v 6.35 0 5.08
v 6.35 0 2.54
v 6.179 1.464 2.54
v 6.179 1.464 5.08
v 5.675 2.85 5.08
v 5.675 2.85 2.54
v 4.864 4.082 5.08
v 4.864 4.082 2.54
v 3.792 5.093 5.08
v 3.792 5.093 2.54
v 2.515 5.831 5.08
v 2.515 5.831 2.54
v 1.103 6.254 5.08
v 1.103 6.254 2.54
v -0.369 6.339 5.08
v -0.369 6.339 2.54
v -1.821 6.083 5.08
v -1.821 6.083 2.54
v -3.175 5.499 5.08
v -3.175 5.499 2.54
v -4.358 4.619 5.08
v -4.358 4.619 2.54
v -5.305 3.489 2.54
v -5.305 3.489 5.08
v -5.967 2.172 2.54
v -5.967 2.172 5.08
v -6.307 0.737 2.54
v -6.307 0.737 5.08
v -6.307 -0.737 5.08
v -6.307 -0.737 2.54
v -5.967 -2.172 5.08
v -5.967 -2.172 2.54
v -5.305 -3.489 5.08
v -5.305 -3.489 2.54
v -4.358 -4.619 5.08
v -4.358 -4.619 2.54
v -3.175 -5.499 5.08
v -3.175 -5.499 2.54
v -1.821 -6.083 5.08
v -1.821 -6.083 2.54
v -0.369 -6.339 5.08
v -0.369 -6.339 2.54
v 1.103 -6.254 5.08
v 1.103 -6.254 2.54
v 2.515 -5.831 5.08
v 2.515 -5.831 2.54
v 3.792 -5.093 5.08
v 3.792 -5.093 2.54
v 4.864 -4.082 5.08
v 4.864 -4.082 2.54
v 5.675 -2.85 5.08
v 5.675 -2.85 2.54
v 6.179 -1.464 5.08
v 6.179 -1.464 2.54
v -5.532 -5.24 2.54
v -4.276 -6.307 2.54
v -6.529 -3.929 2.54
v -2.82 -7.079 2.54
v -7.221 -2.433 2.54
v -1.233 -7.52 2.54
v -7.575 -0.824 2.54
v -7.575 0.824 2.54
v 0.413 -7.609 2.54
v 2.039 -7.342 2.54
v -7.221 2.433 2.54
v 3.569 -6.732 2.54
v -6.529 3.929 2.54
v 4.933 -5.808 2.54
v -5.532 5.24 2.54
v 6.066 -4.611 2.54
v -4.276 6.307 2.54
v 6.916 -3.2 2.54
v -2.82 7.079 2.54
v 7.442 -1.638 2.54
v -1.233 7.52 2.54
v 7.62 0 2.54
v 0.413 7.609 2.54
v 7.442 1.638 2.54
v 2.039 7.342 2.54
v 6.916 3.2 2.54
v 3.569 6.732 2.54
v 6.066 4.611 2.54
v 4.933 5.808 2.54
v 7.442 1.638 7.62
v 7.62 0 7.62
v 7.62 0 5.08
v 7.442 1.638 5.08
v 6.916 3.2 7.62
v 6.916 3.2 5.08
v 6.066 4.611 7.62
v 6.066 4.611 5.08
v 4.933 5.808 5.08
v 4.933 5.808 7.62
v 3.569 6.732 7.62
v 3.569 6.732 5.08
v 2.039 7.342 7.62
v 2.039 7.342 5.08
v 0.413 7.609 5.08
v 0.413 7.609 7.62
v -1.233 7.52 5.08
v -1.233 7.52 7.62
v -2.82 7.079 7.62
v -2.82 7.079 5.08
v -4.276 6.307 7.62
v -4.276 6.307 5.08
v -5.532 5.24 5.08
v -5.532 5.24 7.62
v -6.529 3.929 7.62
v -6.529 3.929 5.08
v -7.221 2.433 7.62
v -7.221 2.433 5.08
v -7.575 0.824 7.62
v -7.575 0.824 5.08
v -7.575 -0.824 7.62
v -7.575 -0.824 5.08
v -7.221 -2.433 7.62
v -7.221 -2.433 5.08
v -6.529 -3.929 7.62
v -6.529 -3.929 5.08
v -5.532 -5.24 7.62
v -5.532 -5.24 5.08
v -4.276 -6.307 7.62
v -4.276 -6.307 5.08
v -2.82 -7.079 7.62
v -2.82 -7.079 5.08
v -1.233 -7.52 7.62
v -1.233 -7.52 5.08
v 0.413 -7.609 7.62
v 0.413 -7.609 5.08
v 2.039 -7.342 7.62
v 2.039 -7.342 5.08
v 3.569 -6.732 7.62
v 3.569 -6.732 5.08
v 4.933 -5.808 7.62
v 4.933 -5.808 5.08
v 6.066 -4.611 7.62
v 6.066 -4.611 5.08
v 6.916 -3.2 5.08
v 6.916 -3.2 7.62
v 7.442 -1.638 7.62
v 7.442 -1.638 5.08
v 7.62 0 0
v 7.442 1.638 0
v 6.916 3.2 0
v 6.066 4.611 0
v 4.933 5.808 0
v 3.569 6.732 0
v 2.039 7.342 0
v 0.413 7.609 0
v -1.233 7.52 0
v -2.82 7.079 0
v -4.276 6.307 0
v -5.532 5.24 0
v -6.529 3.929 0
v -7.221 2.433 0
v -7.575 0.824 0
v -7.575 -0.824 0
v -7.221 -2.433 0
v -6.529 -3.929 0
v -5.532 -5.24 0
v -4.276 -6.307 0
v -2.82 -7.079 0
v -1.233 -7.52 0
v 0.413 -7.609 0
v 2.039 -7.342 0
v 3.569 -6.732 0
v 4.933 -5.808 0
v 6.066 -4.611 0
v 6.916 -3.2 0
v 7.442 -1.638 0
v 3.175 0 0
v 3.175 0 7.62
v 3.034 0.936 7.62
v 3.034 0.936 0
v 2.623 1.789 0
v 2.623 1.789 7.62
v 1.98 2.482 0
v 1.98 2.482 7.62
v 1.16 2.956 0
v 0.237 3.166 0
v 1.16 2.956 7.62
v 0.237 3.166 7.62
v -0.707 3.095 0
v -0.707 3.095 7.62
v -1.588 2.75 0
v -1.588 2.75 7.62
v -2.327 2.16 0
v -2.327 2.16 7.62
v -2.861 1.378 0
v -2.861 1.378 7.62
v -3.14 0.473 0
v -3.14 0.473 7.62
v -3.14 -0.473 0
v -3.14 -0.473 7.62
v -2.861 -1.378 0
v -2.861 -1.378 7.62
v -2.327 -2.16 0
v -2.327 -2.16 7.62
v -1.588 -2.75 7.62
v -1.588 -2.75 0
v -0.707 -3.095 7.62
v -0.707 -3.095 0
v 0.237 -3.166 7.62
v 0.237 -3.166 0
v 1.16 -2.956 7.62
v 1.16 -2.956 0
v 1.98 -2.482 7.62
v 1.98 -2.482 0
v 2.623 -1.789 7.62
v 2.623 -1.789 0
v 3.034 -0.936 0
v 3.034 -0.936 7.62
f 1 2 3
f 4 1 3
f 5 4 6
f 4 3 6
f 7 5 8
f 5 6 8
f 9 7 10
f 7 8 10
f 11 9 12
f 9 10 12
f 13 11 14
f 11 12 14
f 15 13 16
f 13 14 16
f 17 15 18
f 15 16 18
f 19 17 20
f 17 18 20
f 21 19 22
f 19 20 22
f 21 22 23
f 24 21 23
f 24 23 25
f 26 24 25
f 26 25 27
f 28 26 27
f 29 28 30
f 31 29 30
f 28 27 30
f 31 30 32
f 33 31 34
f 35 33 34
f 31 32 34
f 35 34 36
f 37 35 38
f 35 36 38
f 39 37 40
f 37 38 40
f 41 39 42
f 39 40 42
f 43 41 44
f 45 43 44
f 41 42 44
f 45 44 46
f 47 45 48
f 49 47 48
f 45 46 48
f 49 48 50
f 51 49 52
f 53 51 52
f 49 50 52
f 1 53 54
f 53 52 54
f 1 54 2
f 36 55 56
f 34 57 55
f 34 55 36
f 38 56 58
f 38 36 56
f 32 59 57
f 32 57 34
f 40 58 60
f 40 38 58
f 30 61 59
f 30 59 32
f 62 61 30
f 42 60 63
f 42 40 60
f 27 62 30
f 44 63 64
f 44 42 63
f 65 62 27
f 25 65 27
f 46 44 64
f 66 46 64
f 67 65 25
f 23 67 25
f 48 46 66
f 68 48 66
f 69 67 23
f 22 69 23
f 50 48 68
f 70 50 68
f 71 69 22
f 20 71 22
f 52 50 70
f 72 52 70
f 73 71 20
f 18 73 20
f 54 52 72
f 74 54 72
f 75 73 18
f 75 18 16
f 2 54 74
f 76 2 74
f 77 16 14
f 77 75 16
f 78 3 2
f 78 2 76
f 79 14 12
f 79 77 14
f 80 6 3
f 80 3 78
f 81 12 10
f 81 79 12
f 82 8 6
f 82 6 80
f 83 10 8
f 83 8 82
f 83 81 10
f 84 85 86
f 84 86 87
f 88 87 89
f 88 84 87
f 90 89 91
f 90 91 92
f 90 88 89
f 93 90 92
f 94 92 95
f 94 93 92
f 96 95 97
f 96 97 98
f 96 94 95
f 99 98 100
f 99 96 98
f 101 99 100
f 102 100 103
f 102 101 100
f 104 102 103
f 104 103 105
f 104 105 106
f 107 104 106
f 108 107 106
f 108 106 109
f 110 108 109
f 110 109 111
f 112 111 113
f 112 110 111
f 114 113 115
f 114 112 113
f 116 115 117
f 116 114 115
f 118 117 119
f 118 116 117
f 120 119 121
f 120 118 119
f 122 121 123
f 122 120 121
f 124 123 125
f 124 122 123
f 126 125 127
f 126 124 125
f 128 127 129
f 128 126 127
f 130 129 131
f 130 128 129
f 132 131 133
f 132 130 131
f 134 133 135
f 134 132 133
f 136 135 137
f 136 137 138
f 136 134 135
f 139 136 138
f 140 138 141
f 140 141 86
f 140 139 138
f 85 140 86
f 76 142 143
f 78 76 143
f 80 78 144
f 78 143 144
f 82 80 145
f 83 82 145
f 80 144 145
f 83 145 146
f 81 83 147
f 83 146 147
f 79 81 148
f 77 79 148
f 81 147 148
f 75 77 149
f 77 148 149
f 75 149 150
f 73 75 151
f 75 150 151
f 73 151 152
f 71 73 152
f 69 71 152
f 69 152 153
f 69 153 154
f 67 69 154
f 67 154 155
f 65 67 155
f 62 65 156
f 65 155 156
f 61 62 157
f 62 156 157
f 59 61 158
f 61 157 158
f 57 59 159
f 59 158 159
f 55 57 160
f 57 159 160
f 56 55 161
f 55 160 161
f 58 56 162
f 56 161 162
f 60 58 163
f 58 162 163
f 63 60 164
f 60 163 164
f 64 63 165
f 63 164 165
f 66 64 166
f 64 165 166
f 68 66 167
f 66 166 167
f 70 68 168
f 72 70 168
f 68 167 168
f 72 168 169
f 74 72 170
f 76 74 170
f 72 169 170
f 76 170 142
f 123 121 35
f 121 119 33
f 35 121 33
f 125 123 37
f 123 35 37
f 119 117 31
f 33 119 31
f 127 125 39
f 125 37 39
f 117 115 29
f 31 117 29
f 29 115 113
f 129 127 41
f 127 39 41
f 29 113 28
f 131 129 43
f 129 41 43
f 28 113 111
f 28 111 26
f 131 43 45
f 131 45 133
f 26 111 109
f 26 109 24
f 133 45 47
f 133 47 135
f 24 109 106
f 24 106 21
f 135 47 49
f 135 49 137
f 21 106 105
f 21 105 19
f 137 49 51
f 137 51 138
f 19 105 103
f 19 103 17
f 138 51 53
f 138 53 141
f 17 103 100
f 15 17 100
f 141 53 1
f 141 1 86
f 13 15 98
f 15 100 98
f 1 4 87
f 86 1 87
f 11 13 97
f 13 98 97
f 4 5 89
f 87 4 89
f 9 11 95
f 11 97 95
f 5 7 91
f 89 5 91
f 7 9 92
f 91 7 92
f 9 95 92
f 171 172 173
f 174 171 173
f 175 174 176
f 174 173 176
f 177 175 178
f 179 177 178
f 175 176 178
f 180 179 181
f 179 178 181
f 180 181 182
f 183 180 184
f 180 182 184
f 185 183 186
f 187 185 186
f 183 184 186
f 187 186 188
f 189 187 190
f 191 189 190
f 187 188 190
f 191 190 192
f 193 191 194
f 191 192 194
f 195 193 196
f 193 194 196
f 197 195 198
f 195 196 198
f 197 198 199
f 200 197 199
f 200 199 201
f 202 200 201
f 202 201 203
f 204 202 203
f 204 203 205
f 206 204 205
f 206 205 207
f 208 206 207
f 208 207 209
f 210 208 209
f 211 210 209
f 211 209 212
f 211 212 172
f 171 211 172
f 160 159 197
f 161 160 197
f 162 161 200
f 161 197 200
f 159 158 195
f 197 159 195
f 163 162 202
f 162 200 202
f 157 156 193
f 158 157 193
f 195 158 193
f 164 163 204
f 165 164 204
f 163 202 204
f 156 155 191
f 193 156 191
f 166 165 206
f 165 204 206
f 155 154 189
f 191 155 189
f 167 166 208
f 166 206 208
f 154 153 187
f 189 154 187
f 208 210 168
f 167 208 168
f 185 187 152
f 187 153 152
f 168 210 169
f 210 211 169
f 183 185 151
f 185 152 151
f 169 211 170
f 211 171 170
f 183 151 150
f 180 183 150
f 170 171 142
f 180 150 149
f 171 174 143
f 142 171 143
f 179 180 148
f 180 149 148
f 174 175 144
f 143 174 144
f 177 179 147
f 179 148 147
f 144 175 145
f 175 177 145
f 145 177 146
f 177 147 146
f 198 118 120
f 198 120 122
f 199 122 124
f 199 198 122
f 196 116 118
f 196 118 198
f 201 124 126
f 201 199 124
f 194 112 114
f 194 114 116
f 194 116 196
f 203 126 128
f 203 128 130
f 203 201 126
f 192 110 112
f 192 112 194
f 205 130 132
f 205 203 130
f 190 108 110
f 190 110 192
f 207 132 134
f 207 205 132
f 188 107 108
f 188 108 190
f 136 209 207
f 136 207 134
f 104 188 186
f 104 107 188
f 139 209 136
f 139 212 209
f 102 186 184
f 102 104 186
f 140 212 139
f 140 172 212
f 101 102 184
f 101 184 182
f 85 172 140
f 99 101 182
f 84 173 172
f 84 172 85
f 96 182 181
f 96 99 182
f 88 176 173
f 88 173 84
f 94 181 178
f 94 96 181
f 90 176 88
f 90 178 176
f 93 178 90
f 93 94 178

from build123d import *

# Parameters (mm, degrees)
SKETCH1_R           = 7.62
BOSS_EXTRUDE1_DEPTH = 2.54
SKETCH2_R           = 6.35
BOSS_EXTRUDE2_DEPTH = 2.54
SKETCH4_R           = 3.175
CUT_EXTRUDE1_DEPTH  = 8.62


with BuildPart() as part:
    # Sketch1 → Boss-Extrude1 (new body)
    with BuildSketch(Plane.XY):
        Circle(SKETCH1_R)
    boss_extrude1 = extrude(amount=BOSS_EXTRUDE1_DEPTH)

    # Sketch2 → Boss-Extrude2 (add)
    with BuildSketch(Plane.XY.offset(2.54)):
        Circle(SKETCH2_R)
    extrude(amount=BOSS_EXTRUDE2_DEPTH)

    # Mirror1: Boss-Extrude1 across plane
    add(boss_extrude1.mirror(Plane.XY.offset(3.81)))

    # Sketch4 → Cut-Extrude1 (cut, through all)
    with BuildSketch(Plane.XY.offset(7.62)):
        Circle(SKETCH4_R)
    extrude(amount=-CUT_EXTRUDE1_DEPTH, mode=Mode.SUBTRACT)


solid = part.part
